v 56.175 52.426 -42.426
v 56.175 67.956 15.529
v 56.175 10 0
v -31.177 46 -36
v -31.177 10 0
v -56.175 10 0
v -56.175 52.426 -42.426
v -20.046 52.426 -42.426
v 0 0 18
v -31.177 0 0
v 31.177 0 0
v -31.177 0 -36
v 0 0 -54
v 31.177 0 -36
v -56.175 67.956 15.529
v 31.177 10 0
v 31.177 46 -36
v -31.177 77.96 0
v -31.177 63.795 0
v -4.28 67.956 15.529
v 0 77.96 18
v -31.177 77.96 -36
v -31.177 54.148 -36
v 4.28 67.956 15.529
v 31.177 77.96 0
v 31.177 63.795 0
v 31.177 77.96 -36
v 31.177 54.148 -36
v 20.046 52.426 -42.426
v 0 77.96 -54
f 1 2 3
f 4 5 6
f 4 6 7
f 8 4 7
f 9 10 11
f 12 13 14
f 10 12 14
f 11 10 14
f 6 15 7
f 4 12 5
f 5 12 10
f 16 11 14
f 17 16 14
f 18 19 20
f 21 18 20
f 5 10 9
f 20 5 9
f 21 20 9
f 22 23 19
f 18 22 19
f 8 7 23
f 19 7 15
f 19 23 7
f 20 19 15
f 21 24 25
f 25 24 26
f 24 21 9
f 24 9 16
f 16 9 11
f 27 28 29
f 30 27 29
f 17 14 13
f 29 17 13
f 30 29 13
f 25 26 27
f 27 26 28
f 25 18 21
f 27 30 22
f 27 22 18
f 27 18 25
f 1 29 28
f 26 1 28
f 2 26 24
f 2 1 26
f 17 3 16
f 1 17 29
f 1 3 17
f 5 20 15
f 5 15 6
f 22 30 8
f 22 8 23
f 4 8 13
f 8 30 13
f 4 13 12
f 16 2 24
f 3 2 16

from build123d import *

# Parameters (mm, degrees)
EXTRUDE1_DEPTH = 77.96
EXTRUDE2_DEPTH = 56.175


with BuildPart() as part:
    # Sketch3 → Extrude1 (new body)
    with BuildSketch(Plane(origin=(0, 0, 0), x_dir=(1, 0, 0), z_dir=(0, 1, 0))):
        Polygon((0, 54), (-31.176914536, 36), (-31.176914536, 0), (0, -18), (31.176914536, 0), (31.176914536, 36), align=None)
    extrude(amount=EXTRUDE1_DEPTH)

    # Sketch2 → Extrude2 (add, symmetric)
    with BuildSketch(Plane(origin=(0, 0, 0), x_dir=(0, 0, -1), z_dir=(1, 0, 0))):
        Polygon((0, 10), (42.426406871, 52.426406871), (-15.529142706, 67.955549577), align=None)
    extrude(amount=EXTRUDE2_DEPTH, both=True)


solid = part.part
